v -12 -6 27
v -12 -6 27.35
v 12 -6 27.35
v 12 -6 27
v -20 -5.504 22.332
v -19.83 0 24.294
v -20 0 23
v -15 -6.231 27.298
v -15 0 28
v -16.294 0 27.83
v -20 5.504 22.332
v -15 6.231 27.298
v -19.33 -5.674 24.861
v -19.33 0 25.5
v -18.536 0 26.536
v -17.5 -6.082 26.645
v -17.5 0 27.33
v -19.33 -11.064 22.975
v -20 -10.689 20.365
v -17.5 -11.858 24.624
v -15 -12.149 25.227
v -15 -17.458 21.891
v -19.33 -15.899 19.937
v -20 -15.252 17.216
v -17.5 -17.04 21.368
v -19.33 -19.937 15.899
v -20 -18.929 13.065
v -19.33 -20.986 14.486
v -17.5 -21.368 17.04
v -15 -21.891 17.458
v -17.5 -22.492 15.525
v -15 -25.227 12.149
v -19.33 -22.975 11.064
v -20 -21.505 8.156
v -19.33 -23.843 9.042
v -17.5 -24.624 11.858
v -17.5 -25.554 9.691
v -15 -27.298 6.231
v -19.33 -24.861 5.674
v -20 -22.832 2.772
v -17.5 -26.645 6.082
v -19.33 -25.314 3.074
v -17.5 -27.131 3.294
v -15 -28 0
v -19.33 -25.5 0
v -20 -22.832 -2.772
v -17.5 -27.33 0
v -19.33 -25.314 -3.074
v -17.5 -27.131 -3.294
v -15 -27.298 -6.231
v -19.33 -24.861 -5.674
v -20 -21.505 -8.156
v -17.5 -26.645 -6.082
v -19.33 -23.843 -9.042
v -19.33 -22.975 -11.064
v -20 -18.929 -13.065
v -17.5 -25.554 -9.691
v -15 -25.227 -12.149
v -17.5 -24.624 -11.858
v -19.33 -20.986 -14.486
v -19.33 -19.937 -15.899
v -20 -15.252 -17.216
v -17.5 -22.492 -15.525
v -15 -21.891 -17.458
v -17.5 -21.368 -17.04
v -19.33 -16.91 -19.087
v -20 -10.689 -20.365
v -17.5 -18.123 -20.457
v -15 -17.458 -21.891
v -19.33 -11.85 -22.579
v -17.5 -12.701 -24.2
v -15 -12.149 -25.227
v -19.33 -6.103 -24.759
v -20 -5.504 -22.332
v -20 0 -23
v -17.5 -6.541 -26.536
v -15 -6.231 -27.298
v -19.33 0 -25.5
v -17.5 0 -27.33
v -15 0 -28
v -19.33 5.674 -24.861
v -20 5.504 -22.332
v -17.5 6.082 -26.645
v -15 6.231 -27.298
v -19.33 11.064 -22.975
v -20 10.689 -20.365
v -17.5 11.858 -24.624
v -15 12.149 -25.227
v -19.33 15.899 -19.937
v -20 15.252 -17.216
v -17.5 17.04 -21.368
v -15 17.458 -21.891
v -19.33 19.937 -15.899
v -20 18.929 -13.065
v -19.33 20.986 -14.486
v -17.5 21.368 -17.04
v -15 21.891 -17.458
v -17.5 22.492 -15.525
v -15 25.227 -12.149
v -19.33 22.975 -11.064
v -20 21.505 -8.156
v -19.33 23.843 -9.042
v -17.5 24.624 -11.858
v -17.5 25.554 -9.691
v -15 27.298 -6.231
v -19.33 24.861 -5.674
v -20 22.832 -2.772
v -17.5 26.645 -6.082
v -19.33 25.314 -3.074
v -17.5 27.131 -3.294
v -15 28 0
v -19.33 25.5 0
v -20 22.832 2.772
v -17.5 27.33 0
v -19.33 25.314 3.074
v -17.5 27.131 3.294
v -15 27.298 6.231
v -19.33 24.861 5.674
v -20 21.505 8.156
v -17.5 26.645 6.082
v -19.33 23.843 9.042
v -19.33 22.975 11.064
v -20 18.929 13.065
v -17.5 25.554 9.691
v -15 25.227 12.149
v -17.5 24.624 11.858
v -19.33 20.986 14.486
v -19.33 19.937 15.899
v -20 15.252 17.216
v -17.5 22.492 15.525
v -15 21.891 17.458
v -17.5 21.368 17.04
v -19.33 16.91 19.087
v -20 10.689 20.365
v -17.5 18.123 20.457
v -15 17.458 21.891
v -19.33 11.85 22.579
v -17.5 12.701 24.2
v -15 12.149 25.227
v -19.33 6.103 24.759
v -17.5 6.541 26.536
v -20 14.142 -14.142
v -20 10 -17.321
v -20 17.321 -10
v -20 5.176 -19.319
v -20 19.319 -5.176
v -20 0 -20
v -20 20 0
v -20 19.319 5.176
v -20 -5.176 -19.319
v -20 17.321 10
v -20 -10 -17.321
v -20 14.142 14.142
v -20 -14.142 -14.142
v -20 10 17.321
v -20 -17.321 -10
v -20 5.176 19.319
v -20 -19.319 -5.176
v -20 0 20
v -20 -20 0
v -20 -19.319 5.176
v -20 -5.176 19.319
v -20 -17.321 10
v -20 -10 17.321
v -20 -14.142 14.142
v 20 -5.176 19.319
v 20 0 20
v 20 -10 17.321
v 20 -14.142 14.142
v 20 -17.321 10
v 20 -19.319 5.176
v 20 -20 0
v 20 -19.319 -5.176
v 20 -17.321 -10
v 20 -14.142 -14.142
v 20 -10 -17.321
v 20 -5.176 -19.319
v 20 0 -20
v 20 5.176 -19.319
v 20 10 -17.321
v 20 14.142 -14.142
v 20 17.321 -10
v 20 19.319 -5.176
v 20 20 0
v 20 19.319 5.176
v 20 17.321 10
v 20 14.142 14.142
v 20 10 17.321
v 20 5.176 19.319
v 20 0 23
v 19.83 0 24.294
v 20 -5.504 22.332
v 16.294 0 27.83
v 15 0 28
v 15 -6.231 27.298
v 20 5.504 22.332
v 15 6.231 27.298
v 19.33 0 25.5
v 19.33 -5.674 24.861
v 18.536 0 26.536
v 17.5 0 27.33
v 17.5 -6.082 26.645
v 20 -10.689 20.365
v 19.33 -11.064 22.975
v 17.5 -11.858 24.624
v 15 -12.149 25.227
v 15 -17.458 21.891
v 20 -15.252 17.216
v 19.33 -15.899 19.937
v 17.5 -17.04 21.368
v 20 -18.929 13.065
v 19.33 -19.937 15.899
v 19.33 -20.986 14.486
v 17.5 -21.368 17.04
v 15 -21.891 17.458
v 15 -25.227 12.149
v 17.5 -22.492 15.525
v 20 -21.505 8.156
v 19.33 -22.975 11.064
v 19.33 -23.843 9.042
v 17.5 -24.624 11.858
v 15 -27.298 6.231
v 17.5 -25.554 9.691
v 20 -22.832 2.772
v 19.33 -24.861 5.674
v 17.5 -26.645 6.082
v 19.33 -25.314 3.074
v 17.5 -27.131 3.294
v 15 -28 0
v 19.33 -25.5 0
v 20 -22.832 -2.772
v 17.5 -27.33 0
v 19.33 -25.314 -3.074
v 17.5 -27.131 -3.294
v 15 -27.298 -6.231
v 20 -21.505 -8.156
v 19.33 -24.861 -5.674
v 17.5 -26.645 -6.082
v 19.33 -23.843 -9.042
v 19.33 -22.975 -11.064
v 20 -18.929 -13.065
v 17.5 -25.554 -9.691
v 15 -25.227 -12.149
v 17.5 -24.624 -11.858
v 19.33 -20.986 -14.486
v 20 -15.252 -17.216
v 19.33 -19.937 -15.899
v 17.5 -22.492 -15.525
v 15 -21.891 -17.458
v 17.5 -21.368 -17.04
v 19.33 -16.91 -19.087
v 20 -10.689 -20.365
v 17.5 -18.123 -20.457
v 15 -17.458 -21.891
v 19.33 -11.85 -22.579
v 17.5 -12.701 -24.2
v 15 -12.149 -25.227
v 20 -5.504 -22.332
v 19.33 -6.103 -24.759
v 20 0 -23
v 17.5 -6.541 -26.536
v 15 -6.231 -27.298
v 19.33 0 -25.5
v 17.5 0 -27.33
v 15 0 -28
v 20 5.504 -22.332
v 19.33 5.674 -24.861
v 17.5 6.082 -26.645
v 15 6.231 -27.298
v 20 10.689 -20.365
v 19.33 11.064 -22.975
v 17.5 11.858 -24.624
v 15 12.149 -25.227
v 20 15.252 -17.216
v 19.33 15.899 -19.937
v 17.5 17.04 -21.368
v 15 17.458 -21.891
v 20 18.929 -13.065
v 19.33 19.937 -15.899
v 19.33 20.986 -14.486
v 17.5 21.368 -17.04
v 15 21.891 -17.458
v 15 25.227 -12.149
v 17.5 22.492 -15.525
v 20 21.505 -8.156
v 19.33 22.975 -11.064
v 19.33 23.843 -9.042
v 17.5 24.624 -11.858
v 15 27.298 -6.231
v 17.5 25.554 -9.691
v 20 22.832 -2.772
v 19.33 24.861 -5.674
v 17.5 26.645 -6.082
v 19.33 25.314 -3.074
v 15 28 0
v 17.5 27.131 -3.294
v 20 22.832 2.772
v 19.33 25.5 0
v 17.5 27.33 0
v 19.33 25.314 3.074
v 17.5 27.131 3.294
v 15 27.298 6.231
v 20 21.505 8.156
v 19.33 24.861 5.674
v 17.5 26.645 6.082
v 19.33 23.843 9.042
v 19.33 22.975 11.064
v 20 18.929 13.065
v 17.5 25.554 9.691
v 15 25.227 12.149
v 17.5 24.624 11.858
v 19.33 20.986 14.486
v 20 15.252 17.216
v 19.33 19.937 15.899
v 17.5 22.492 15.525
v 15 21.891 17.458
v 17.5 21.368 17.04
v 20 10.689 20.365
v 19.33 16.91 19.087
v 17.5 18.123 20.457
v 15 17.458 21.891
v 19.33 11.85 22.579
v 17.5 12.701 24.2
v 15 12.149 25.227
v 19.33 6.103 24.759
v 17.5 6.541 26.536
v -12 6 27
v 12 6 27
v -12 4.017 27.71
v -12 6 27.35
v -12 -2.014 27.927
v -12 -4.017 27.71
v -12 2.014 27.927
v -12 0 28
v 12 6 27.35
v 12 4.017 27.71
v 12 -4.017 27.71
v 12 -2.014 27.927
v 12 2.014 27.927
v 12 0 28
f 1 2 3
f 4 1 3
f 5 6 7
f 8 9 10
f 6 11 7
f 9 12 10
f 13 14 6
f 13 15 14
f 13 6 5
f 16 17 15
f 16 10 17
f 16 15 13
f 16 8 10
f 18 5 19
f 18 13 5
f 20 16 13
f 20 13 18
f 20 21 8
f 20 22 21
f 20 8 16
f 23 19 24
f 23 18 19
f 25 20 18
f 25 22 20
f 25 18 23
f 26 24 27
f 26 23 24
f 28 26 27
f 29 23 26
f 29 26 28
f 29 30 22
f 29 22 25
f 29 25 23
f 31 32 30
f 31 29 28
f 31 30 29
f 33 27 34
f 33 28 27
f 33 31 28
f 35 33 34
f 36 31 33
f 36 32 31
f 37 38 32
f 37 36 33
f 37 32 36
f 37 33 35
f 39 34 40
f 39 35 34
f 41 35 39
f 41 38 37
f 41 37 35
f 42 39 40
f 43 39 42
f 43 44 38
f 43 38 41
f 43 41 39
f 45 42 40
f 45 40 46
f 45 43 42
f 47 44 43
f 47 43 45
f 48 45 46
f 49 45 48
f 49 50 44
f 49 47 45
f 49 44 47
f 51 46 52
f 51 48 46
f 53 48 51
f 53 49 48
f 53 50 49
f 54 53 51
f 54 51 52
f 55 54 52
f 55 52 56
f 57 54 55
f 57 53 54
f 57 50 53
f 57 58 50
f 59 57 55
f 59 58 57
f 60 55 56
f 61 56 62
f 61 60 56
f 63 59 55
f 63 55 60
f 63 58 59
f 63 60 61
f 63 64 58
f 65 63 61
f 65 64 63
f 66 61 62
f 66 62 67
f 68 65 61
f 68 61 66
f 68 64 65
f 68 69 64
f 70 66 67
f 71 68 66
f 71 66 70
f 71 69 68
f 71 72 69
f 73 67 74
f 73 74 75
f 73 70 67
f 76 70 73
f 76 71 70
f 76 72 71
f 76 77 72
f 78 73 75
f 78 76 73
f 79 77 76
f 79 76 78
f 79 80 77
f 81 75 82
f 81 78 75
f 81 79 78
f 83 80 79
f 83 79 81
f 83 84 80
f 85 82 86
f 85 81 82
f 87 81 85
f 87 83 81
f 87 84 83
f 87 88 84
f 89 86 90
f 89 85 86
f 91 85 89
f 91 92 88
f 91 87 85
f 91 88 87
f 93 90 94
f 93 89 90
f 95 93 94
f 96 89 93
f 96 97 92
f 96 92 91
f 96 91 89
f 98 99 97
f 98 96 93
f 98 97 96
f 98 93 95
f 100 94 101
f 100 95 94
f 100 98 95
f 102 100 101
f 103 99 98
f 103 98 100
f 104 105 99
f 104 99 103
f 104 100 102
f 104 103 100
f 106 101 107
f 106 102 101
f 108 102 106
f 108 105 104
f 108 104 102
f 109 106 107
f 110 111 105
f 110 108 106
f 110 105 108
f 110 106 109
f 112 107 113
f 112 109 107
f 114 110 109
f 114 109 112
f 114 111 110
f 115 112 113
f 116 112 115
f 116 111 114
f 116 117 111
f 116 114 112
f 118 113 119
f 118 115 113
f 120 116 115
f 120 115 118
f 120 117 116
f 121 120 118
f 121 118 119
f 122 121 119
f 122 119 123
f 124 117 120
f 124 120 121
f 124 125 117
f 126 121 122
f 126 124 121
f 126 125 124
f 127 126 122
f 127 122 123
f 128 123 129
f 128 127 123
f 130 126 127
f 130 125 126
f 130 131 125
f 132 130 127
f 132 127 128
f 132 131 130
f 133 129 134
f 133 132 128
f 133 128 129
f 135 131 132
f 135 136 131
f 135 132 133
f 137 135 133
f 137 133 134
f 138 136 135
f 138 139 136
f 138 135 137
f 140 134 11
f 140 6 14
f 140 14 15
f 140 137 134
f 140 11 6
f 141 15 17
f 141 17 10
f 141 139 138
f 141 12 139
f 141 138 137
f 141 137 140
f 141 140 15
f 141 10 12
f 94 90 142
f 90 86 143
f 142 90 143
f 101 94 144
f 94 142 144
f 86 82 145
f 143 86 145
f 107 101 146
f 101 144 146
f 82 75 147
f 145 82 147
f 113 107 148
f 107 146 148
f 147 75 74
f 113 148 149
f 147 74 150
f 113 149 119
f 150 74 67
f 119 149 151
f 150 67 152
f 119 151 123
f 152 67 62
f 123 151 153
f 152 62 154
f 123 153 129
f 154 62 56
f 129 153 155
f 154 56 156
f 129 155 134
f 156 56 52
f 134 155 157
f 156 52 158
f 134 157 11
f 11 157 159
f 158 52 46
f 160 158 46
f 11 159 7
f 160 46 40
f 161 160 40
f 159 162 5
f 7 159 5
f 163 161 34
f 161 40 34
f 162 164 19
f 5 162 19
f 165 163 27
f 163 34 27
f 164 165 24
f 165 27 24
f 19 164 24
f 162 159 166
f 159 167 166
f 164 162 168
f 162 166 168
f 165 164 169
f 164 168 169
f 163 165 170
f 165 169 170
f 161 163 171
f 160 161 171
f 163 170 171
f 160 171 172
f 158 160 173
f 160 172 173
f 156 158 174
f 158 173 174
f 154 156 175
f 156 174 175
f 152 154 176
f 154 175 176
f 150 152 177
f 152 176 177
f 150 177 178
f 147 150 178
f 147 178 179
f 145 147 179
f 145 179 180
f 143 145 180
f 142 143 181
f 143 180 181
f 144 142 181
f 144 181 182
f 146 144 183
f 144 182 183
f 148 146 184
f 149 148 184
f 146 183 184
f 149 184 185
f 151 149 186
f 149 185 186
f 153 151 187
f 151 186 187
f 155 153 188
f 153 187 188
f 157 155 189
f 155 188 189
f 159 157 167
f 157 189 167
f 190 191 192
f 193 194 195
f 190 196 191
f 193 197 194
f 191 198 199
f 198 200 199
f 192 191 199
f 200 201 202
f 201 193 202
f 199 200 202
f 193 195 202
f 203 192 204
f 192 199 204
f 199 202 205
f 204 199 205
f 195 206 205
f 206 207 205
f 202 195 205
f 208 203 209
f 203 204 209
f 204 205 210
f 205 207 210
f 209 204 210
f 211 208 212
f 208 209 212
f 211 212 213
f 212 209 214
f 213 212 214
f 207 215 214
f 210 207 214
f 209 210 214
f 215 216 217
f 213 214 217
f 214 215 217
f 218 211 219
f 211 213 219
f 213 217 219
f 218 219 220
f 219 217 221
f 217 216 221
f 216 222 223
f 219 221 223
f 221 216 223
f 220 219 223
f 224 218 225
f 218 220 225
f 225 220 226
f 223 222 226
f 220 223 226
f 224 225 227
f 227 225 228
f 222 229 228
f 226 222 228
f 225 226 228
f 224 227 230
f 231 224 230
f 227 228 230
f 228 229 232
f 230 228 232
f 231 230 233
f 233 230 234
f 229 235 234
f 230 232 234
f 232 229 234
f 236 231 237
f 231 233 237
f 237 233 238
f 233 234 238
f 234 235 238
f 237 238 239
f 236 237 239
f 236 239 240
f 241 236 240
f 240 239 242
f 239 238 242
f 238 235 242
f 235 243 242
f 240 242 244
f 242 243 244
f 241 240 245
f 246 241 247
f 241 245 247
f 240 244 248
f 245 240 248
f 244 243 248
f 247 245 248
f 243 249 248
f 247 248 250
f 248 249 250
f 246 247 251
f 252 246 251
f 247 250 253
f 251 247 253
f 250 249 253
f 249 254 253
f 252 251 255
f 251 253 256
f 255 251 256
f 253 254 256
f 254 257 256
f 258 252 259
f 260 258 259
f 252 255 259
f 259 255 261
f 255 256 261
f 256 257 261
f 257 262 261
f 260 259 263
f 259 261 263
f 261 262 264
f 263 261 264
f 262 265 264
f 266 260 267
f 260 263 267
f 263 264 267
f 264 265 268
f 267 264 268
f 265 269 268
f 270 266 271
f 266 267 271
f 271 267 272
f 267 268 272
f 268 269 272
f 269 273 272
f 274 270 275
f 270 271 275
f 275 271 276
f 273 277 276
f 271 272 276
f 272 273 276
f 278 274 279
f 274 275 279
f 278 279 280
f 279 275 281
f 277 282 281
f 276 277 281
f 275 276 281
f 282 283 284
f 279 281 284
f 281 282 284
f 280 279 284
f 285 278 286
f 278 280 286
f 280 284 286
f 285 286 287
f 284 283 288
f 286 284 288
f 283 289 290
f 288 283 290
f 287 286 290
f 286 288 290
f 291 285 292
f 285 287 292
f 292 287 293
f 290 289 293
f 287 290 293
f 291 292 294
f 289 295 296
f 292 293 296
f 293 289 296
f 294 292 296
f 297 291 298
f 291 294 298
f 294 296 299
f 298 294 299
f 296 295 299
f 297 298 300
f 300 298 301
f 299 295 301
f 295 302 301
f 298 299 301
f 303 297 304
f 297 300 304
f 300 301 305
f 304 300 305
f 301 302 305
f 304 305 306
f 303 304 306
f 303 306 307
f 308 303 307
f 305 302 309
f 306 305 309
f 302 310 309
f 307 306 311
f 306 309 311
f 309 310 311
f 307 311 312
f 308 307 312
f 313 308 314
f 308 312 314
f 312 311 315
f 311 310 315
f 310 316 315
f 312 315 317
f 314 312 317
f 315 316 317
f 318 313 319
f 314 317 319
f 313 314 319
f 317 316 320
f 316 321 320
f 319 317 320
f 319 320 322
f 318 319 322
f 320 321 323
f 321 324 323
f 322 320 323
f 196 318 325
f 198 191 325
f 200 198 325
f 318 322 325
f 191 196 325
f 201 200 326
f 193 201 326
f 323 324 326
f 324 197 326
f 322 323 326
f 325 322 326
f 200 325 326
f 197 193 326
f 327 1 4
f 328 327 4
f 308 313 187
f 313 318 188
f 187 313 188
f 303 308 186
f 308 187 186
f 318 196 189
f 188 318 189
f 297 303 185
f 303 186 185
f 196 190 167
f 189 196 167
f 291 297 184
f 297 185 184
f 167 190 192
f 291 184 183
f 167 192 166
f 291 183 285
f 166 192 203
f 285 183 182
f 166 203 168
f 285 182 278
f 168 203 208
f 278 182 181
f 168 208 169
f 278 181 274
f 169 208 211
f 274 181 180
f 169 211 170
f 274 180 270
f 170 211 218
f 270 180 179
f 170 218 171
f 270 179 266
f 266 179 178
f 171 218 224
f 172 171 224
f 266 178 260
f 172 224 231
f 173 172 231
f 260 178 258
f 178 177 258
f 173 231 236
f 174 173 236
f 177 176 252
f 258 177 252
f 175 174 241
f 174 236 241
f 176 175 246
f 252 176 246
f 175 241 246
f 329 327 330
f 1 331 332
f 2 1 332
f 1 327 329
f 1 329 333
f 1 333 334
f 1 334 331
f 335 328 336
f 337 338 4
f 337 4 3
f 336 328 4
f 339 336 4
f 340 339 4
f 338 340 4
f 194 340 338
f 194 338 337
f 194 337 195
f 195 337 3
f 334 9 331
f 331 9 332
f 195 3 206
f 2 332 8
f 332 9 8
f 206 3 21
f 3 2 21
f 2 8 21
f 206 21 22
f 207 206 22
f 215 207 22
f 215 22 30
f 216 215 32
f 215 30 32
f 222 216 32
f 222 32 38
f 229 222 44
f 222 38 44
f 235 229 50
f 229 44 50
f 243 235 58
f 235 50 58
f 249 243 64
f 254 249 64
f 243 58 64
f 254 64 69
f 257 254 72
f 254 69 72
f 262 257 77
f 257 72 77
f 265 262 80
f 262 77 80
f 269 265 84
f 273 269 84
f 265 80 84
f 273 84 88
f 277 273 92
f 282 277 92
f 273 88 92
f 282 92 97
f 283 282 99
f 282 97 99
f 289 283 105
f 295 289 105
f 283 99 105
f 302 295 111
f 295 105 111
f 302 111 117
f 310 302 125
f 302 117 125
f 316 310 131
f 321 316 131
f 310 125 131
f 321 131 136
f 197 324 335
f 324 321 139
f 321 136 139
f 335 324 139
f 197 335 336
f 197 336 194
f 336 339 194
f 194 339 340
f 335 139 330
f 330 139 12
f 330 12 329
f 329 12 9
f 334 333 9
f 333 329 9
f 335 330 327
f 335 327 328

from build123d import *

# Parameters (mm, degrees)
F0_W     = 24
F0_H     = 1
F2_R     = 5
F3_DEPTH = 6


with BuildPart() as f1:
    # F0 (on Front) → F1 (revolve)
    with BuildSketch(Plane.XZ):
        Polygon((-20, 28), (-20, 20), (0, 20), (20, 20), (20, 28), (12, 28), (12, 27), (-12, 27), (-12, 28), align=None)
        with Locations((0, 27.5)):
            Rectangle(F0_W, F0_H)
    revolve(axis=Axis((2.7690531401, 0, 0), (1, 0, 0)))

    # F2
    f2_edges = [f1.edges().sort_by_distance(p)[0] for p in [
        (20, 0, -28),
        (-20, 0, -28),
    ]]
    fillet(f2_edges, radius=F2_R)

    # F0 (on Front) → F3 (cut, symmetric)
    with BuildSketch(Plane.XZ):
        with Locations((0, 27.5)):
            Rectangle(F0_W, F0_H)
    extrude(amount=F3_DEPTH, both=True, mode=Mode.SUBTRACT)


solid = f1.part
